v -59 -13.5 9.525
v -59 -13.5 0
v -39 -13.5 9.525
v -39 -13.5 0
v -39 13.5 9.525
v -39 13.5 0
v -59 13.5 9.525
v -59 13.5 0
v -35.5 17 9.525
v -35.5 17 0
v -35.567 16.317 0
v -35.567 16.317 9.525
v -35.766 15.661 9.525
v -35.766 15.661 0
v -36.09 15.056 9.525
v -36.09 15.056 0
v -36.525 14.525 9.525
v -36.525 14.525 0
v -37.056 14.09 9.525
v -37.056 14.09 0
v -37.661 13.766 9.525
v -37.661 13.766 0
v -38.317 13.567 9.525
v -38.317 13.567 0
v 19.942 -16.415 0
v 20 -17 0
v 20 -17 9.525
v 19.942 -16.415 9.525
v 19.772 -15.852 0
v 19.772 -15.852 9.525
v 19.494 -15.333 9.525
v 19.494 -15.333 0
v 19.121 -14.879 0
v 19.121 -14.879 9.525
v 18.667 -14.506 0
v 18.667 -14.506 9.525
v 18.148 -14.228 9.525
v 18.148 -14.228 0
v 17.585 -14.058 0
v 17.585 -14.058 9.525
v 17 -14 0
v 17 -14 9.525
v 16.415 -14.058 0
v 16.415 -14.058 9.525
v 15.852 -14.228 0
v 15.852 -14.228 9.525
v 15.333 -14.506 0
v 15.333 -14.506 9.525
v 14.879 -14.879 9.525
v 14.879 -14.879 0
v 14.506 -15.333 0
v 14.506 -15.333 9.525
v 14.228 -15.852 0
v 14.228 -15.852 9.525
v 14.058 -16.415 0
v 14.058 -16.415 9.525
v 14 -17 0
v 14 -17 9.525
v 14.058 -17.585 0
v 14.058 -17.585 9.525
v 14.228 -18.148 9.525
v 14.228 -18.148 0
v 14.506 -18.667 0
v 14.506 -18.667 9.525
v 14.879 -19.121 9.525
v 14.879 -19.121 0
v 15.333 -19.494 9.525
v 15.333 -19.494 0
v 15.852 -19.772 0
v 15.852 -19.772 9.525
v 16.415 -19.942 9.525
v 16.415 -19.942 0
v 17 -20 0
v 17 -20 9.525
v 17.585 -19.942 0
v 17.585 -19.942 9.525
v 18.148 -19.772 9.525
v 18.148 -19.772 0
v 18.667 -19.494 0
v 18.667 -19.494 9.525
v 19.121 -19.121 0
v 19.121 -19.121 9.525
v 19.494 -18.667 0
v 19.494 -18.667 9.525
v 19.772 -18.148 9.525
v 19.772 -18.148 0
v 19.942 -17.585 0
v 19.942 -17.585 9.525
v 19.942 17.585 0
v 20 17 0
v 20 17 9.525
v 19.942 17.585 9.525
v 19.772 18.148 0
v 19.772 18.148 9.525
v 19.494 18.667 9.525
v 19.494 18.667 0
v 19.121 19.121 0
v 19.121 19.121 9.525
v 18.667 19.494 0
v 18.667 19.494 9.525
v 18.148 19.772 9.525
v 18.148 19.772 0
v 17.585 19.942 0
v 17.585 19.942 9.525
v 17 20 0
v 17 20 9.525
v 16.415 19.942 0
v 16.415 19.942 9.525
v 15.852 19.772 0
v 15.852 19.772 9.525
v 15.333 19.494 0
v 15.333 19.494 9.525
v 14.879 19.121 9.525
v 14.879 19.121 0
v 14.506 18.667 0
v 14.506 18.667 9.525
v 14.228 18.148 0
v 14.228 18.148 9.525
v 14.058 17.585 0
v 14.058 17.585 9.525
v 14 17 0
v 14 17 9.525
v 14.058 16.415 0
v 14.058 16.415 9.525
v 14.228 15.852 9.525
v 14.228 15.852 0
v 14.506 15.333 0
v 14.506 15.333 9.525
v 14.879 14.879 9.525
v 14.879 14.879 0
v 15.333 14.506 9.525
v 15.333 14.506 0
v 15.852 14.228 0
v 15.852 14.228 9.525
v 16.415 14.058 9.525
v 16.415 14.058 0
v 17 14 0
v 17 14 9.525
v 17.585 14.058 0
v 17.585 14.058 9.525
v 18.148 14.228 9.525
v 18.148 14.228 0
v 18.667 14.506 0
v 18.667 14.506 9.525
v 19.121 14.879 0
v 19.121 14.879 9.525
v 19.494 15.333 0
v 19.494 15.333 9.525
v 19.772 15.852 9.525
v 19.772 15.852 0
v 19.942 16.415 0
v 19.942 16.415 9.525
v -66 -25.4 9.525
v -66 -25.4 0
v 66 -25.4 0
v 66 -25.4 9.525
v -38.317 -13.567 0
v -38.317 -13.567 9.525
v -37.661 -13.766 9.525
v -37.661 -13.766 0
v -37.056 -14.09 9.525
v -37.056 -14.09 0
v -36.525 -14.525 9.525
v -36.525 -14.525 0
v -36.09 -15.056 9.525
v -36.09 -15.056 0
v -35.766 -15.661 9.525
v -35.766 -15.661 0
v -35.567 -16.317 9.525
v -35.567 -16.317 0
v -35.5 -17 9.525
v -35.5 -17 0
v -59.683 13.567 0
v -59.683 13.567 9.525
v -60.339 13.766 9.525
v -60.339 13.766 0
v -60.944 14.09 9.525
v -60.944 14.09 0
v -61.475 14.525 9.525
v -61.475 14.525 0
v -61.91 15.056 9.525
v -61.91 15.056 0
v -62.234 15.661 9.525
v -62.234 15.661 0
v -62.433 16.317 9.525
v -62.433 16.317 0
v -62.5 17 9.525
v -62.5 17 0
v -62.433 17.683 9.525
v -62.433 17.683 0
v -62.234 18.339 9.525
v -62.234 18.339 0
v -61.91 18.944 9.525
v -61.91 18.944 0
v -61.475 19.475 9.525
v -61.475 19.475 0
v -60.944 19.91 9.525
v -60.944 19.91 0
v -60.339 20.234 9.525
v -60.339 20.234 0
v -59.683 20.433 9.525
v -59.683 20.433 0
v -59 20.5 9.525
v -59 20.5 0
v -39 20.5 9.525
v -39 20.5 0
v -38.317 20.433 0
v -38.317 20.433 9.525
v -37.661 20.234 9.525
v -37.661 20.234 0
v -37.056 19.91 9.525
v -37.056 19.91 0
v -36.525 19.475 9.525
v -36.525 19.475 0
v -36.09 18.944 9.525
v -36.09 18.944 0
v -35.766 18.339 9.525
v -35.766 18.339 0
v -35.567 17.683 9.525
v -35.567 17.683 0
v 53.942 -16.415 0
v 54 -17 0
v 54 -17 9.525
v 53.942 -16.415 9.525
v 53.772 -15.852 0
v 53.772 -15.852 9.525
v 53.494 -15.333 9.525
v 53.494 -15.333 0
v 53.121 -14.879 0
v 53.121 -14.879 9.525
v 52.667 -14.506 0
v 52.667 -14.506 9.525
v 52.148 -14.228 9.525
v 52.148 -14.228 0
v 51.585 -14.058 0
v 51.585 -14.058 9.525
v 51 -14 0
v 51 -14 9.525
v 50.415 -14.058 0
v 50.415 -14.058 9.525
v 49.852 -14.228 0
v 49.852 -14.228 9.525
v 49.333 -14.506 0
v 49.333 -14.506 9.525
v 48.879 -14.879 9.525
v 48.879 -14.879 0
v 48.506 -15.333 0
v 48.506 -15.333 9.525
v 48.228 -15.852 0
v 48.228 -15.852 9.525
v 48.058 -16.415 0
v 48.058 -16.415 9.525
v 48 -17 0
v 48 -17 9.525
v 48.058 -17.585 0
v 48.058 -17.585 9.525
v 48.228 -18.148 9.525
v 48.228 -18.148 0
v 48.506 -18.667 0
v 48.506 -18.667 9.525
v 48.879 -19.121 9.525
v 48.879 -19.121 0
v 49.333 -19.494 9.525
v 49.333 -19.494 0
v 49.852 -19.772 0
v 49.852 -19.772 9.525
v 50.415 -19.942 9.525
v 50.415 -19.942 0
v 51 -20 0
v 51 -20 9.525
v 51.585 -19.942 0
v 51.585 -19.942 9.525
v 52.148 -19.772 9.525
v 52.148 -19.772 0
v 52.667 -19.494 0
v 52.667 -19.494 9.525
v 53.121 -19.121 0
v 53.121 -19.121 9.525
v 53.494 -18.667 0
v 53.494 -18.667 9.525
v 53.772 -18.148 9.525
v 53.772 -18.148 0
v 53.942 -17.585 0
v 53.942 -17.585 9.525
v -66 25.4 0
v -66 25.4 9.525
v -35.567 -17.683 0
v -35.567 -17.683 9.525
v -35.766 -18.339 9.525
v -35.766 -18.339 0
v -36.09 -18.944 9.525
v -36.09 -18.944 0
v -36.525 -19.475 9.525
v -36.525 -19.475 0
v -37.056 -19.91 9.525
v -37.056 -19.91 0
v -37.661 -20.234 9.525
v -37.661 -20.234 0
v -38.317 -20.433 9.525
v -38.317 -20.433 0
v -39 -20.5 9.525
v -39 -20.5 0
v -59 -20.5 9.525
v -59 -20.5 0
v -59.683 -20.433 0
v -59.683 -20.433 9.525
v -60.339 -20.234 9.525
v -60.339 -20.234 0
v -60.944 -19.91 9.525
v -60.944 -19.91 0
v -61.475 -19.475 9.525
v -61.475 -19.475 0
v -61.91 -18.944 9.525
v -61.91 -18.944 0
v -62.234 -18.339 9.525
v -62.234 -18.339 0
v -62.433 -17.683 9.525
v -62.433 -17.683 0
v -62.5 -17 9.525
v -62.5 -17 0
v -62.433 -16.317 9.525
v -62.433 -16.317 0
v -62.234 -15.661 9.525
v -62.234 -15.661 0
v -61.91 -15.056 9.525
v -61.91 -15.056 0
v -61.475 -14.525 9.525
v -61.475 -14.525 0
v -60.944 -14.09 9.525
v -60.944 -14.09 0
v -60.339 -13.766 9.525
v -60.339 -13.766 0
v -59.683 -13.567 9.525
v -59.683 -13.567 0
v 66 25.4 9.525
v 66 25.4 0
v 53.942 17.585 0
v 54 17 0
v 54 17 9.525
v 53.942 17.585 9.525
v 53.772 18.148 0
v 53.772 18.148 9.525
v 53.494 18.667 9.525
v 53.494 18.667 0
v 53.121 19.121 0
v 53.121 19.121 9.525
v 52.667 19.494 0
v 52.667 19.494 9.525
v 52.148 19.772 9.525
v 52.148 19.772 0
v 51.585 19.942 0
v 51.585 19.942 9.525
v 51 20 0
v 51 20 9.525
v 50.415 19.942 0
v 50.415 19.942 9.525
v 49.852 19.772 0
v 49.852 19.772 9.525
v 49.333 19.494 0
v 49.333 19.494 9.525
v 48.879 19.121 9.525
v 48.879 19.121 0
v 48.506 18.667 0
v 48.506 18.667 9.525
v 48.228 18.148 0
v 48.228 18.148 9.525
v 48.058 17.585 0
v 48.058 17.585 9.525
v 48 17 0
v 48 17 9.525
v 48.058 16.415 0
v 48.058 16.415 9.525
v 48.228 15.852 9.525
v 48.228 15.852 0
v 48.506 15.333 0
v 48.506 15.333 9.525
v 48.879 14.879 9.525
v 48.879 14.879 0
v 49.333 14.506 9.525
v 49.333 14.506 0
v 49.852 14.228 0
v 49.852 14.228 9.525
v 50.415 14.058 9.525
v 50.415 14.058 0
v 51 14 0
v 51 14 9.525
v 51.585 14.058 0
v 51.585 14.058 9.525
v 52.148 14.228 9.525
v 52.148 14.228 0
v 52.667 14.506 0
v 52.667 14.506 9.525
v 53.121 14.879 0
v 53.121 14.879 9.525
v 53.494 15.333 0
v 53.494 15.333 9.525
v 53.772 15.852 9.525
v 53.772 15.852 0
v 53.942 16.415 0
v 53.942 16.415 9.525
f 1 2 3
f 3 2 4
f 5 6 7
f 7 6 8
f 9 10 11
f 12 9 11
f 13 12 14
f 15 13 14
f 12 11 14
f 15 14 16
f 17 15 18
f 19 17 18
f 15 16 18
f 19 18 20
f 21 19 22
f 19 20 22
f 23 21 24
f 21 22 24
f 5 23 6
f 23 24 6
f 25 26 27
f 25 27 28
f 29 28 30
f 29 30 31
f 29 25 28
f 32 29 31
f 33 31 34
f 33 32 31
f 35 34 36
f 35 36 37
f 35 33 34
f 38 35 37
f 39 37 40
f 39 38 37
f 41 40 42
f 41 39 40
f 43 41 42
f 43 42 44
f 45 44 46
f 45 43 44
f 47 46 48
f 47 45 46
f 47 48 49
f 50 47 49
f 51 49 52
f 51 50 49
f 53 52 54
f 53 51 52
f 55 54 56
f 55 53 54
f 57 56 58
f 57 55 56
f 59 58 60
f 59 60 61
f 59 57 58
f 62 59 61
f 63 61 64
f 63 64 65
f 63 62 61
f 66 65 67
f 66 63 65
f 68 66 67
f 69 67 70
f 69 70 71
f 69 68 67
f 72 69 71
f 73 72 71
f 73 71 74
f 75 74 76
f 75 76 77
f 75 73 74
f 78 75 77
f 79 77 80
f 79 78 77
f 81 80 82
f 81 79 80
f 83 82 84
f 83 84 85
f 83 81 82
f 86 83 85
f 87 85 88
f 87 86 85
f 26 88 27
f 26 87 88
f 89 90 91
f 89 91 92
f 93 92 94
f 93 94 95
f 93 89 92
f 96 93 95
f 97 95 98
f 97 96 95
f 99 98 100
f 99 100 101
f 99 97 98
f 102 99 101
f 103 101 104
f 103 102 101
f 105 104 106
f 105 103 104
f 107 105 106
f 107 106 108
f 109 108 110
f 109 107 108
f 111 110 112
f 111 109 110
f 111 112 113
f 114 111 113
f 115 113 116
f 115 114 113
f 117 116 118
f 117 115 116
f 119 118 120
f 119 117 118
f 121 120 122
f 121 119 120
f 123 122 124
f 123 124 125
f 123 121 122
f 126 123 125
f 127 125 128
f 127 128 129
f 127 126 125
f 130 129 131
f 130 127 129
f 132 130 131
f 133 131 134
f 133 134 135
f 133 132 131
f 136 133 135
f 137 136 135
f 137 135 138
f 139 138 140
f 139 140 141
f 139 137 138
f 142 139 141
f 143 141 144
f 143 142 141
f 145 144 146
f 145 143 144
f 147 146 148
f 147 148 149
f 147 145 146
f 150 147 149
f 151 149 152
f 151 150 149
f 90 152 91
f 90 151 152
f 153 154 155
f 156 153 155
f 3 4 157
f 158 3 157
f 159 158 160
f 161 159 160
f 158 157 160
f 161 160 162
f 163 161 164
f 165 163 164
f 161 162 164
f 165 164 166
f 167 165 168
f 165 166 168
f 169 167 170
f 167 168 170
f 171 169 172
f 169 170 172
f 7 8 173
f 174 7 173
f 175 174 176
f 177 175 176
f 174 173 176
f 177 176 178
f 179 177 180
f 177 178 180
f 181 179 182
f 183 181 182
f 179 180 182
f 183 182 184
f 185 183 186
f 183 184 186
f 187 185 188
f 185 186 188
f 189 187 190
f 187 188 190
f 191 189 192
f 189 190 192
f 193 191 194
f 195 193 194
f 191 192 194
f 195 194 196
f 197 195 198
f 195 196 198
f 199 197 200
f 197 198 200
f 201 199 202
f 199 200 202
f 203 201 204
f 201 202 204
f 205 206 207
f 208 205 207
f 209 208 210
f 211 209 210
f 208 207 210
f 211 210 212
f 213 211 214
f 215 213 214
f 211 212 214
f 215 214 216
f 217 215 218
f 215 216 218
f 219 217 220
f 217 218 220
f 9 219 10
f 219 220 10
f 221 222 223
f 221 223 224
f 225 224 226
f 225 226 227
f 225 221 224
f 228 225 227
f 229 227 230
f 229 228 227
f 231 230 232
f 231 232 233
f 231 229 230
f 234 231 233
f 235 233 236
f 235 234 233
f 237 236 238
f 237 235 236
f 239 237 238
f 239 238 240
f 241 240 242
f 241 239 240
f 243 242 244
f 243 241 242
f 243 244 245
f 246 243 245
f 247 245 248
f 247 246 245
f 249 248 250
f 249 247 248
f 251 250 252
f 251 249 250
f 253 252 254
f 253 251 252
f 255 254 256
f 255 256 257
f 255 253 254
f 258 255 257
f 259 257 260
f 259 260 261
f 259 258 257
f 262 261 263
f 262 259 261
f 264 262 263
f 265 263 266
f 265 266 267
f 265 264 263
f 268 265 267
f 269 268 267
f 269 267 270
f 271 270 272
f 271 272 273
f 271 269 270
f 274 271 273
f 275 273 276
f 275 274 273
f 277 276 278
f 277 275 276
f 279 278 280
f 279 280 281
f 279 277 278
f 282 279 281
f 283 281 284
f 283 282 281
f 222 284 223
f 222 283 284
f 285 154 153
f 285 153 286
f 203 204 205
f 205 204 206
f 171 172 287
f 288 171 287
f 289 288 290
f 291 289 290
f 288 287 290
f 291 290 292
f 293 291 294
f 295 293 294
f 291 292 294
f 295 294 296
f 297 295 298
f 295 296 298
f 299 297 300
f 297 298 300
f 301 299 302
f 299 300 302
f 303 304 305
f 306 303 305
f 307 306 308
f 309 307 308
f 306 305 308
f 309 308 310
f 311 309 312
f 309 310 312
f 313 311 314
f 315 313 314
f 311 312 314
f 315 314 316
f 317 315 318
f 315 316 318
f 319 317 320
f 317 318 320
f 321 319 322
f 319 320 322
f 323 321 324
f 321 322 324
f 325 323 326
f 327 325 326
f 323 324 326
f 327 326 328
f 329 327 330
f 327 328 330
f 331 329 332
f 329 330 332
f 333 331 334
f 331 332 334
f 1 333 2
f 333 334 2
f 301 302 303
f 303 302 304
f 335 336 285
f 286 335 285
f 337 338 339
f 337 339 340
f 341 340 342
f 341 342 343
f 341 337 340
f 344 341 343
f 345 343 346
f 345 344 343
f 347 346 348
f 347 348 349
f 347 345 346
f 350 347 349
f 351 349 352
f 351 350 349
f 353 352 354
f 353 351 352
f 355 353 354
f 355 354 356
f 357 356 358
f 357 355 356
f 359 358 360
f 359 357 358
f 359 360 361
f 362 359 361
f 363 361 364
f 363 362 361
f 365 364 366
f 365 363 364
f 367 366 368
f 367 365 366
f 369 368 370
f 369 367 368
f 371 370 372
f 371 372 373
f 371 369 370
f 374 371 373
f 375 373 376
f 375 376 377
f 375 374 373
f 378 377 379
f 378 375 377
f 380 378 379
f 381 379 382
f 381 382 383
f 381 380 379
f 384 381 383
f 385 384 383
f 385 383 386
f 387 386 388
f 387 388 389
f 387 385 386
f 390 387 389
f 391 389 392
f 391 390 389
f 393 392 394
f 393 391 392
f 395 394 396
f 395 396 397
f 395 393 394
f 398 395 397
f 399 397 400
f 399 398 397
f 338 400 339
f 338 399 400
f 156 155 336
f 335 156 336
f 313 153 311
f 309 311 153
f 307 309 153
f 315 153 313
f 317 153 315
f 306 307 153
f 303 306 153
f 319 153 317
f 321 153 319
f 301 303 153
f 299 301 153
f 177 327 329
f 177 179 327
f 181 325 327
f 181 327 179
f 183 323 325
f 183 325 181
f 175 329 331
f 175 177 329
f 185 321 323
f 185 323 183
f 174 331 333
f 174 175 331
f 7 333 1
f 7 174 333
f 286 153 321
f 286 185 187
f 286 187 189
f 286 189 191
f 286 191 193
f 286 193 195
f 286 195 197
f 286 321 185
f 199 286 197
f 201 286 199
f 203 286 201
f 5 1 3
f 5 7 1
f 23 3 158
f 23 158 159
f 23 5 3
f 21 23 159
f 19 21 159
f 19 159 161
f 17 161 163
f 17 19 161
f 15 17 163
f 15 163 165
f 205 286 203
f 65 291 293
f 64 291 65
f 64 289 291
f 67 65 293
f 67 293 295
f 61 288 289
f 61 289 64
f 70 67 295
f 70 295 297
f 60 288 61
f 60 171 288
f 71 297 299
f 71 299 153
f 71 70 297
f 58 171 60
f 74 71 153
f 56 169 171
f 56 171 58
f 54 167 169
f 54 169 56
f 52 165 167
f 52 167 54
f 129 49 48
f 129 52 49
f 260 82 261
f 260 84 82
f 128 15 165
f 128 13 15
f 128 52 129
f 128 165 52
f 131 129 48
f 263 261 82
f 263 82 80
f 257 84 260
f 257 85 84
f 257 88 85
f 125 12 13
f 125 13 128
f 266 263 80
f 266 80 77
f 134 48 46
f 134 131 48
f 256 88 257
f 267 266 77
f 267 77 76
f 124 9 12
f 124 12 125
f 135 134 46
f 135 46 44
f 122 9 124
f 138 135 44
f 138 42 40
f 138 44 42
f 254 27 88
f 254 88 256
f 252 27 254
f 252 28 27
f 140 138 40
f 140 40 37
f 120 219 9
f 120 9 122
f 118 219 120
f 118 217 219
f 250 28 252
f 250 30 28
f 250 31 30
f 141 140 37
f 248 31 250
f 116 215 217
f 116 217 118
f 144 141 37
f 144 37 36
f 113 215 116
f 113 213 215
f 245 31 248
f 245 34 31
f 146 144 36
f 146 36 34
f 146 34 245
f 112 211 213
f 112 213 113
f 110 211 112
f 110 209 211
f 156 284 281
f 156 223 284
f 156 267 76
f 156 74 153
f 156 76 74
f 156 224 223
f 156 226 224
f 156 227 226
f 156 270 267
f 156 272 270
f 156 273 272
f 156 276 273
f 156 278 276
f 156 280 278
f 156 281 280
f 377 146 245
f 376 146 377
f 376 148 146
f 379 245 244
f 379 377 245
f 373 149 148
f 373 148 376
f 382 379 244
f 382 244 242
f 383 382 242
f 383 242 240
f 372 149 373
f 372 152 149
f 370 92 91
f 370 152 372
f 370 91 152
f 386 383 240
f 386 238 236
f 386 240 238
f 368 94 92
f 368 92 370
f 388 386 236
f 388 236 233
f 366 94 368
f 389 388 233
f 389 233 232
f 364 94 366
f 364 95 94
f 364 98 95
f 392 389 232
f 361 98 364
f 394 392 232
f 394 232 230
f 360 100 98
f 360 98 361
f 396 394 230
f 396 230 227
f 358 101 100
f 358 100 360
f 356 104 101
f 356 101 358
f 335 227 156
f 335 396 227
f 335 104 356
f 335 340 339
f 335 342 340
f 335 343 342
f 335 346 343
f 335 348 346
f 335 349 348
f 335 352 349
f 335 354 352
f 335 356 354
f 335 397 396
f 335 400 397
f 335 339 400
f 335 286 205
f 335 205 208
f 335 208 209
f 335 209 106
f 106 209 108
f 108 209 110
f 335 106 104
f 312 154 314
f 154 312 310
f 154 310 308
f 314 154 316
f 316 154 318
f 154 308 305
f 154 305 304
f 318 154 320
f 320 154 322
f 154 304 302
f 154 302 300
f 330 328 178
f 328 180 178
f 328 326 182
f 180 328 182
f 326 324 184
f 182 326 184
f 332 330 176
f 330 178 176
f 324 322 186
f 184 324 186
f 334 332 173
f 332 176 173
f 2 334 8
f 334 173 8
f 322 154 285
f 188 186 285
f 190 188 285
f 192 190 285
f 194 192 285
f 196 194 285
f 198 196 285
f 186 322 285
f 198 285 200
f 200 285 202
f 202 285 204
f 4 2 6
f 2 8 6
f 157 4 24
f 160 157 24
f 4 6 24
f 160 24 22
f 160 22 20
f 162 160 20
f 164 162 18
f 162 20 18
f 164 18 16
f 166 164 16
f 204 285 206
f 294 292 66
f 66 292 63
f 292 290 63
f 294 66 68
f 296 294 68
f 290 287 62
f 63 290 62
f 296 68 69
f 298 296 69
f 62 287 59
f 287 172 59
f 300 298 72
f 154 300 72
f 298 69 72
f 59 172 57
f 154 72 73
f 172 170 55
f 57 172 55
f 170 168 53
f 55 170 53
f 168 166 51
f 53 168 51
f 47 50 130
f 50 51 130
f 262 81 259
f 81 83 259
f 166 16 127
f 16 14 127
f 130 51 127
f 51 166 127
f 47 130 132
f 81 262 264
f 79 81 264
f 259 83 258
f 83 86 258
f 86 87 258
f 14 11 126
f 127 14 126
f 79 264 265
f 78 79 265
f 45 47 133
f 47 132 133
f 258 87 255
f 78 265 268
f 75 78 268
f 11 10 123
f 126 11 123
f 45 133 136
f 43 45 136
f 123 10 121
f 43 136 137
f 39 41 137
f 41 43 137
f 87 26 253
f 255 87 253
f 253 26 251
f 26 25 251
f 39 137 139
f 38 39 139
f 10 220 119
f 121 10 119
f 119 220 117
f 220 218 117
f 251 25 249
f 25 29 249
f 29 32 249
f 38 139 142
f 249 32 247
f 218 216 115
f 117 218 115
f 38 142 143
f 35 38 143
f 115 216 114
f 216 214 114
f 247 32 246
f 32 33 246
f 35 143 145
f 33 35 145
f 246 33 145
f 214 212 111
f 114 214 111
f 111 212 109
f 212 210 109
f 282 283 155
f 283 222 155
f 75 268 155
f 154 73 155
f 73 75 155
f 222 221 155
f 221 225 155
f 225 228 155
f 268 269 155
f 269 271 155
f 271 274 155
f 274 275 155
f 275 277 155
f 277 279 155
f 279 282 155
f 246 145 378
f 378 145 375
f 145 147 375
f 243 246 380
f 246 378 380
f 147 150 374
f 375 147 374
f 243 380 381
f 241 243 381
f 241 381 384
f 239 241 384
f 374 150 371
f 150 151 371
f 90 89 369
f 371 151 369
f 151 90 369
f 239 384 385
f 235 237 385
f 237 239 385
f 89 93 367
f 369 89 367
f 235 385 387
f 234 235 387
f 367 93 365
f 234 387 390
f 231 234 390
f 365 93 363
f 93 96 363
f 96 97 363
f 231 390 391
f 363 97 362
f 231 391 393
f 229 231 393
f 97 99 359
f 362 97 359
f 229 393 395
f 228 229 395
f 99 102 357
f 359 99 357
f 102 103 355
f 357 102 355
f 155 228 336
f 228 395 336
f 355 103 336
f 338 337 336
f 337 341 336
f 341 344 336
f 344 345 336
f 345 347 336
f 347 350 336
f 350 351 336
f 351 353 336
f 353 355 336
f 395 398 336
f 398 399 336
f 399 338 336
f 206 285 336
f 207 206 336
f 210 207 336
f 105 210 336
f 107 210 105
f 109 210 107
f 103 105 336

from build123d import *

# Parameters (mm, degrees)
F0_W     = 100
F0_H     = 50.8
F0_R     = 3
F0_W_2   = 32
F1_DEPTH = 9.525


with BuildPart() as f1:
    # F0 (on Top) → F1 (new body)
    with BuildSketch(Plane.XY):
        with Locations((-16, 0)):
            Rectangle(F0_W, F0_H)
        with BuildLine():
            Line((-59, -13.5), (-39, -13.5))
            ThreePointArc((-39, -13.5), (-36.525126, -14.525126), (-35.5, -17))
            ThreePointArc((-35.5, -17), (-36.525126, -19.474874), (-39, -20.5))
            Line((-39, -20.5), (-59, -20.5))
            ThreePointArc((-59, -20.5), (-62.5, -17), (-59, -13.5))
        make_face(mode=Mode.SUBTRACT)
        with Locations((17, -17)):
            Circle(F0_R, mode=Mode.SUBTRACT)
        with BuildLine():
            ThreePointArc((-59, 13.5), (-62.5, 17), (-59, 20.5))
            Line((-59, 20.5), (-39, 20.5))
            ThreePointArc((-39, 20.5), (-36.525126, 19.474874), (-35.5, 17))
            ThreePointArc((-35.5, 17), (-36.525126, 14.525126), (-39, 13.5))
            Line((-39, 13.5), (-59, 13.5))
        make_face(mode=Mode.SUBTRACT)
        with Locations((17, 17)):
            Circle(F0_R, mode=Mode.SUBTRACT)
        with Locations((50, 0)):
            Rectangle(F0_W_2, F0_H)
        with Locations((51, -17)):
            Circle(F0_R, mode=Mode.SUBTRACT)
        with Locations((51, 17)):
            Circle(F0_R, mode=Mode.SUBTRACT)
    extrude(amount=F1_DEPTH)


solid = f1.part
